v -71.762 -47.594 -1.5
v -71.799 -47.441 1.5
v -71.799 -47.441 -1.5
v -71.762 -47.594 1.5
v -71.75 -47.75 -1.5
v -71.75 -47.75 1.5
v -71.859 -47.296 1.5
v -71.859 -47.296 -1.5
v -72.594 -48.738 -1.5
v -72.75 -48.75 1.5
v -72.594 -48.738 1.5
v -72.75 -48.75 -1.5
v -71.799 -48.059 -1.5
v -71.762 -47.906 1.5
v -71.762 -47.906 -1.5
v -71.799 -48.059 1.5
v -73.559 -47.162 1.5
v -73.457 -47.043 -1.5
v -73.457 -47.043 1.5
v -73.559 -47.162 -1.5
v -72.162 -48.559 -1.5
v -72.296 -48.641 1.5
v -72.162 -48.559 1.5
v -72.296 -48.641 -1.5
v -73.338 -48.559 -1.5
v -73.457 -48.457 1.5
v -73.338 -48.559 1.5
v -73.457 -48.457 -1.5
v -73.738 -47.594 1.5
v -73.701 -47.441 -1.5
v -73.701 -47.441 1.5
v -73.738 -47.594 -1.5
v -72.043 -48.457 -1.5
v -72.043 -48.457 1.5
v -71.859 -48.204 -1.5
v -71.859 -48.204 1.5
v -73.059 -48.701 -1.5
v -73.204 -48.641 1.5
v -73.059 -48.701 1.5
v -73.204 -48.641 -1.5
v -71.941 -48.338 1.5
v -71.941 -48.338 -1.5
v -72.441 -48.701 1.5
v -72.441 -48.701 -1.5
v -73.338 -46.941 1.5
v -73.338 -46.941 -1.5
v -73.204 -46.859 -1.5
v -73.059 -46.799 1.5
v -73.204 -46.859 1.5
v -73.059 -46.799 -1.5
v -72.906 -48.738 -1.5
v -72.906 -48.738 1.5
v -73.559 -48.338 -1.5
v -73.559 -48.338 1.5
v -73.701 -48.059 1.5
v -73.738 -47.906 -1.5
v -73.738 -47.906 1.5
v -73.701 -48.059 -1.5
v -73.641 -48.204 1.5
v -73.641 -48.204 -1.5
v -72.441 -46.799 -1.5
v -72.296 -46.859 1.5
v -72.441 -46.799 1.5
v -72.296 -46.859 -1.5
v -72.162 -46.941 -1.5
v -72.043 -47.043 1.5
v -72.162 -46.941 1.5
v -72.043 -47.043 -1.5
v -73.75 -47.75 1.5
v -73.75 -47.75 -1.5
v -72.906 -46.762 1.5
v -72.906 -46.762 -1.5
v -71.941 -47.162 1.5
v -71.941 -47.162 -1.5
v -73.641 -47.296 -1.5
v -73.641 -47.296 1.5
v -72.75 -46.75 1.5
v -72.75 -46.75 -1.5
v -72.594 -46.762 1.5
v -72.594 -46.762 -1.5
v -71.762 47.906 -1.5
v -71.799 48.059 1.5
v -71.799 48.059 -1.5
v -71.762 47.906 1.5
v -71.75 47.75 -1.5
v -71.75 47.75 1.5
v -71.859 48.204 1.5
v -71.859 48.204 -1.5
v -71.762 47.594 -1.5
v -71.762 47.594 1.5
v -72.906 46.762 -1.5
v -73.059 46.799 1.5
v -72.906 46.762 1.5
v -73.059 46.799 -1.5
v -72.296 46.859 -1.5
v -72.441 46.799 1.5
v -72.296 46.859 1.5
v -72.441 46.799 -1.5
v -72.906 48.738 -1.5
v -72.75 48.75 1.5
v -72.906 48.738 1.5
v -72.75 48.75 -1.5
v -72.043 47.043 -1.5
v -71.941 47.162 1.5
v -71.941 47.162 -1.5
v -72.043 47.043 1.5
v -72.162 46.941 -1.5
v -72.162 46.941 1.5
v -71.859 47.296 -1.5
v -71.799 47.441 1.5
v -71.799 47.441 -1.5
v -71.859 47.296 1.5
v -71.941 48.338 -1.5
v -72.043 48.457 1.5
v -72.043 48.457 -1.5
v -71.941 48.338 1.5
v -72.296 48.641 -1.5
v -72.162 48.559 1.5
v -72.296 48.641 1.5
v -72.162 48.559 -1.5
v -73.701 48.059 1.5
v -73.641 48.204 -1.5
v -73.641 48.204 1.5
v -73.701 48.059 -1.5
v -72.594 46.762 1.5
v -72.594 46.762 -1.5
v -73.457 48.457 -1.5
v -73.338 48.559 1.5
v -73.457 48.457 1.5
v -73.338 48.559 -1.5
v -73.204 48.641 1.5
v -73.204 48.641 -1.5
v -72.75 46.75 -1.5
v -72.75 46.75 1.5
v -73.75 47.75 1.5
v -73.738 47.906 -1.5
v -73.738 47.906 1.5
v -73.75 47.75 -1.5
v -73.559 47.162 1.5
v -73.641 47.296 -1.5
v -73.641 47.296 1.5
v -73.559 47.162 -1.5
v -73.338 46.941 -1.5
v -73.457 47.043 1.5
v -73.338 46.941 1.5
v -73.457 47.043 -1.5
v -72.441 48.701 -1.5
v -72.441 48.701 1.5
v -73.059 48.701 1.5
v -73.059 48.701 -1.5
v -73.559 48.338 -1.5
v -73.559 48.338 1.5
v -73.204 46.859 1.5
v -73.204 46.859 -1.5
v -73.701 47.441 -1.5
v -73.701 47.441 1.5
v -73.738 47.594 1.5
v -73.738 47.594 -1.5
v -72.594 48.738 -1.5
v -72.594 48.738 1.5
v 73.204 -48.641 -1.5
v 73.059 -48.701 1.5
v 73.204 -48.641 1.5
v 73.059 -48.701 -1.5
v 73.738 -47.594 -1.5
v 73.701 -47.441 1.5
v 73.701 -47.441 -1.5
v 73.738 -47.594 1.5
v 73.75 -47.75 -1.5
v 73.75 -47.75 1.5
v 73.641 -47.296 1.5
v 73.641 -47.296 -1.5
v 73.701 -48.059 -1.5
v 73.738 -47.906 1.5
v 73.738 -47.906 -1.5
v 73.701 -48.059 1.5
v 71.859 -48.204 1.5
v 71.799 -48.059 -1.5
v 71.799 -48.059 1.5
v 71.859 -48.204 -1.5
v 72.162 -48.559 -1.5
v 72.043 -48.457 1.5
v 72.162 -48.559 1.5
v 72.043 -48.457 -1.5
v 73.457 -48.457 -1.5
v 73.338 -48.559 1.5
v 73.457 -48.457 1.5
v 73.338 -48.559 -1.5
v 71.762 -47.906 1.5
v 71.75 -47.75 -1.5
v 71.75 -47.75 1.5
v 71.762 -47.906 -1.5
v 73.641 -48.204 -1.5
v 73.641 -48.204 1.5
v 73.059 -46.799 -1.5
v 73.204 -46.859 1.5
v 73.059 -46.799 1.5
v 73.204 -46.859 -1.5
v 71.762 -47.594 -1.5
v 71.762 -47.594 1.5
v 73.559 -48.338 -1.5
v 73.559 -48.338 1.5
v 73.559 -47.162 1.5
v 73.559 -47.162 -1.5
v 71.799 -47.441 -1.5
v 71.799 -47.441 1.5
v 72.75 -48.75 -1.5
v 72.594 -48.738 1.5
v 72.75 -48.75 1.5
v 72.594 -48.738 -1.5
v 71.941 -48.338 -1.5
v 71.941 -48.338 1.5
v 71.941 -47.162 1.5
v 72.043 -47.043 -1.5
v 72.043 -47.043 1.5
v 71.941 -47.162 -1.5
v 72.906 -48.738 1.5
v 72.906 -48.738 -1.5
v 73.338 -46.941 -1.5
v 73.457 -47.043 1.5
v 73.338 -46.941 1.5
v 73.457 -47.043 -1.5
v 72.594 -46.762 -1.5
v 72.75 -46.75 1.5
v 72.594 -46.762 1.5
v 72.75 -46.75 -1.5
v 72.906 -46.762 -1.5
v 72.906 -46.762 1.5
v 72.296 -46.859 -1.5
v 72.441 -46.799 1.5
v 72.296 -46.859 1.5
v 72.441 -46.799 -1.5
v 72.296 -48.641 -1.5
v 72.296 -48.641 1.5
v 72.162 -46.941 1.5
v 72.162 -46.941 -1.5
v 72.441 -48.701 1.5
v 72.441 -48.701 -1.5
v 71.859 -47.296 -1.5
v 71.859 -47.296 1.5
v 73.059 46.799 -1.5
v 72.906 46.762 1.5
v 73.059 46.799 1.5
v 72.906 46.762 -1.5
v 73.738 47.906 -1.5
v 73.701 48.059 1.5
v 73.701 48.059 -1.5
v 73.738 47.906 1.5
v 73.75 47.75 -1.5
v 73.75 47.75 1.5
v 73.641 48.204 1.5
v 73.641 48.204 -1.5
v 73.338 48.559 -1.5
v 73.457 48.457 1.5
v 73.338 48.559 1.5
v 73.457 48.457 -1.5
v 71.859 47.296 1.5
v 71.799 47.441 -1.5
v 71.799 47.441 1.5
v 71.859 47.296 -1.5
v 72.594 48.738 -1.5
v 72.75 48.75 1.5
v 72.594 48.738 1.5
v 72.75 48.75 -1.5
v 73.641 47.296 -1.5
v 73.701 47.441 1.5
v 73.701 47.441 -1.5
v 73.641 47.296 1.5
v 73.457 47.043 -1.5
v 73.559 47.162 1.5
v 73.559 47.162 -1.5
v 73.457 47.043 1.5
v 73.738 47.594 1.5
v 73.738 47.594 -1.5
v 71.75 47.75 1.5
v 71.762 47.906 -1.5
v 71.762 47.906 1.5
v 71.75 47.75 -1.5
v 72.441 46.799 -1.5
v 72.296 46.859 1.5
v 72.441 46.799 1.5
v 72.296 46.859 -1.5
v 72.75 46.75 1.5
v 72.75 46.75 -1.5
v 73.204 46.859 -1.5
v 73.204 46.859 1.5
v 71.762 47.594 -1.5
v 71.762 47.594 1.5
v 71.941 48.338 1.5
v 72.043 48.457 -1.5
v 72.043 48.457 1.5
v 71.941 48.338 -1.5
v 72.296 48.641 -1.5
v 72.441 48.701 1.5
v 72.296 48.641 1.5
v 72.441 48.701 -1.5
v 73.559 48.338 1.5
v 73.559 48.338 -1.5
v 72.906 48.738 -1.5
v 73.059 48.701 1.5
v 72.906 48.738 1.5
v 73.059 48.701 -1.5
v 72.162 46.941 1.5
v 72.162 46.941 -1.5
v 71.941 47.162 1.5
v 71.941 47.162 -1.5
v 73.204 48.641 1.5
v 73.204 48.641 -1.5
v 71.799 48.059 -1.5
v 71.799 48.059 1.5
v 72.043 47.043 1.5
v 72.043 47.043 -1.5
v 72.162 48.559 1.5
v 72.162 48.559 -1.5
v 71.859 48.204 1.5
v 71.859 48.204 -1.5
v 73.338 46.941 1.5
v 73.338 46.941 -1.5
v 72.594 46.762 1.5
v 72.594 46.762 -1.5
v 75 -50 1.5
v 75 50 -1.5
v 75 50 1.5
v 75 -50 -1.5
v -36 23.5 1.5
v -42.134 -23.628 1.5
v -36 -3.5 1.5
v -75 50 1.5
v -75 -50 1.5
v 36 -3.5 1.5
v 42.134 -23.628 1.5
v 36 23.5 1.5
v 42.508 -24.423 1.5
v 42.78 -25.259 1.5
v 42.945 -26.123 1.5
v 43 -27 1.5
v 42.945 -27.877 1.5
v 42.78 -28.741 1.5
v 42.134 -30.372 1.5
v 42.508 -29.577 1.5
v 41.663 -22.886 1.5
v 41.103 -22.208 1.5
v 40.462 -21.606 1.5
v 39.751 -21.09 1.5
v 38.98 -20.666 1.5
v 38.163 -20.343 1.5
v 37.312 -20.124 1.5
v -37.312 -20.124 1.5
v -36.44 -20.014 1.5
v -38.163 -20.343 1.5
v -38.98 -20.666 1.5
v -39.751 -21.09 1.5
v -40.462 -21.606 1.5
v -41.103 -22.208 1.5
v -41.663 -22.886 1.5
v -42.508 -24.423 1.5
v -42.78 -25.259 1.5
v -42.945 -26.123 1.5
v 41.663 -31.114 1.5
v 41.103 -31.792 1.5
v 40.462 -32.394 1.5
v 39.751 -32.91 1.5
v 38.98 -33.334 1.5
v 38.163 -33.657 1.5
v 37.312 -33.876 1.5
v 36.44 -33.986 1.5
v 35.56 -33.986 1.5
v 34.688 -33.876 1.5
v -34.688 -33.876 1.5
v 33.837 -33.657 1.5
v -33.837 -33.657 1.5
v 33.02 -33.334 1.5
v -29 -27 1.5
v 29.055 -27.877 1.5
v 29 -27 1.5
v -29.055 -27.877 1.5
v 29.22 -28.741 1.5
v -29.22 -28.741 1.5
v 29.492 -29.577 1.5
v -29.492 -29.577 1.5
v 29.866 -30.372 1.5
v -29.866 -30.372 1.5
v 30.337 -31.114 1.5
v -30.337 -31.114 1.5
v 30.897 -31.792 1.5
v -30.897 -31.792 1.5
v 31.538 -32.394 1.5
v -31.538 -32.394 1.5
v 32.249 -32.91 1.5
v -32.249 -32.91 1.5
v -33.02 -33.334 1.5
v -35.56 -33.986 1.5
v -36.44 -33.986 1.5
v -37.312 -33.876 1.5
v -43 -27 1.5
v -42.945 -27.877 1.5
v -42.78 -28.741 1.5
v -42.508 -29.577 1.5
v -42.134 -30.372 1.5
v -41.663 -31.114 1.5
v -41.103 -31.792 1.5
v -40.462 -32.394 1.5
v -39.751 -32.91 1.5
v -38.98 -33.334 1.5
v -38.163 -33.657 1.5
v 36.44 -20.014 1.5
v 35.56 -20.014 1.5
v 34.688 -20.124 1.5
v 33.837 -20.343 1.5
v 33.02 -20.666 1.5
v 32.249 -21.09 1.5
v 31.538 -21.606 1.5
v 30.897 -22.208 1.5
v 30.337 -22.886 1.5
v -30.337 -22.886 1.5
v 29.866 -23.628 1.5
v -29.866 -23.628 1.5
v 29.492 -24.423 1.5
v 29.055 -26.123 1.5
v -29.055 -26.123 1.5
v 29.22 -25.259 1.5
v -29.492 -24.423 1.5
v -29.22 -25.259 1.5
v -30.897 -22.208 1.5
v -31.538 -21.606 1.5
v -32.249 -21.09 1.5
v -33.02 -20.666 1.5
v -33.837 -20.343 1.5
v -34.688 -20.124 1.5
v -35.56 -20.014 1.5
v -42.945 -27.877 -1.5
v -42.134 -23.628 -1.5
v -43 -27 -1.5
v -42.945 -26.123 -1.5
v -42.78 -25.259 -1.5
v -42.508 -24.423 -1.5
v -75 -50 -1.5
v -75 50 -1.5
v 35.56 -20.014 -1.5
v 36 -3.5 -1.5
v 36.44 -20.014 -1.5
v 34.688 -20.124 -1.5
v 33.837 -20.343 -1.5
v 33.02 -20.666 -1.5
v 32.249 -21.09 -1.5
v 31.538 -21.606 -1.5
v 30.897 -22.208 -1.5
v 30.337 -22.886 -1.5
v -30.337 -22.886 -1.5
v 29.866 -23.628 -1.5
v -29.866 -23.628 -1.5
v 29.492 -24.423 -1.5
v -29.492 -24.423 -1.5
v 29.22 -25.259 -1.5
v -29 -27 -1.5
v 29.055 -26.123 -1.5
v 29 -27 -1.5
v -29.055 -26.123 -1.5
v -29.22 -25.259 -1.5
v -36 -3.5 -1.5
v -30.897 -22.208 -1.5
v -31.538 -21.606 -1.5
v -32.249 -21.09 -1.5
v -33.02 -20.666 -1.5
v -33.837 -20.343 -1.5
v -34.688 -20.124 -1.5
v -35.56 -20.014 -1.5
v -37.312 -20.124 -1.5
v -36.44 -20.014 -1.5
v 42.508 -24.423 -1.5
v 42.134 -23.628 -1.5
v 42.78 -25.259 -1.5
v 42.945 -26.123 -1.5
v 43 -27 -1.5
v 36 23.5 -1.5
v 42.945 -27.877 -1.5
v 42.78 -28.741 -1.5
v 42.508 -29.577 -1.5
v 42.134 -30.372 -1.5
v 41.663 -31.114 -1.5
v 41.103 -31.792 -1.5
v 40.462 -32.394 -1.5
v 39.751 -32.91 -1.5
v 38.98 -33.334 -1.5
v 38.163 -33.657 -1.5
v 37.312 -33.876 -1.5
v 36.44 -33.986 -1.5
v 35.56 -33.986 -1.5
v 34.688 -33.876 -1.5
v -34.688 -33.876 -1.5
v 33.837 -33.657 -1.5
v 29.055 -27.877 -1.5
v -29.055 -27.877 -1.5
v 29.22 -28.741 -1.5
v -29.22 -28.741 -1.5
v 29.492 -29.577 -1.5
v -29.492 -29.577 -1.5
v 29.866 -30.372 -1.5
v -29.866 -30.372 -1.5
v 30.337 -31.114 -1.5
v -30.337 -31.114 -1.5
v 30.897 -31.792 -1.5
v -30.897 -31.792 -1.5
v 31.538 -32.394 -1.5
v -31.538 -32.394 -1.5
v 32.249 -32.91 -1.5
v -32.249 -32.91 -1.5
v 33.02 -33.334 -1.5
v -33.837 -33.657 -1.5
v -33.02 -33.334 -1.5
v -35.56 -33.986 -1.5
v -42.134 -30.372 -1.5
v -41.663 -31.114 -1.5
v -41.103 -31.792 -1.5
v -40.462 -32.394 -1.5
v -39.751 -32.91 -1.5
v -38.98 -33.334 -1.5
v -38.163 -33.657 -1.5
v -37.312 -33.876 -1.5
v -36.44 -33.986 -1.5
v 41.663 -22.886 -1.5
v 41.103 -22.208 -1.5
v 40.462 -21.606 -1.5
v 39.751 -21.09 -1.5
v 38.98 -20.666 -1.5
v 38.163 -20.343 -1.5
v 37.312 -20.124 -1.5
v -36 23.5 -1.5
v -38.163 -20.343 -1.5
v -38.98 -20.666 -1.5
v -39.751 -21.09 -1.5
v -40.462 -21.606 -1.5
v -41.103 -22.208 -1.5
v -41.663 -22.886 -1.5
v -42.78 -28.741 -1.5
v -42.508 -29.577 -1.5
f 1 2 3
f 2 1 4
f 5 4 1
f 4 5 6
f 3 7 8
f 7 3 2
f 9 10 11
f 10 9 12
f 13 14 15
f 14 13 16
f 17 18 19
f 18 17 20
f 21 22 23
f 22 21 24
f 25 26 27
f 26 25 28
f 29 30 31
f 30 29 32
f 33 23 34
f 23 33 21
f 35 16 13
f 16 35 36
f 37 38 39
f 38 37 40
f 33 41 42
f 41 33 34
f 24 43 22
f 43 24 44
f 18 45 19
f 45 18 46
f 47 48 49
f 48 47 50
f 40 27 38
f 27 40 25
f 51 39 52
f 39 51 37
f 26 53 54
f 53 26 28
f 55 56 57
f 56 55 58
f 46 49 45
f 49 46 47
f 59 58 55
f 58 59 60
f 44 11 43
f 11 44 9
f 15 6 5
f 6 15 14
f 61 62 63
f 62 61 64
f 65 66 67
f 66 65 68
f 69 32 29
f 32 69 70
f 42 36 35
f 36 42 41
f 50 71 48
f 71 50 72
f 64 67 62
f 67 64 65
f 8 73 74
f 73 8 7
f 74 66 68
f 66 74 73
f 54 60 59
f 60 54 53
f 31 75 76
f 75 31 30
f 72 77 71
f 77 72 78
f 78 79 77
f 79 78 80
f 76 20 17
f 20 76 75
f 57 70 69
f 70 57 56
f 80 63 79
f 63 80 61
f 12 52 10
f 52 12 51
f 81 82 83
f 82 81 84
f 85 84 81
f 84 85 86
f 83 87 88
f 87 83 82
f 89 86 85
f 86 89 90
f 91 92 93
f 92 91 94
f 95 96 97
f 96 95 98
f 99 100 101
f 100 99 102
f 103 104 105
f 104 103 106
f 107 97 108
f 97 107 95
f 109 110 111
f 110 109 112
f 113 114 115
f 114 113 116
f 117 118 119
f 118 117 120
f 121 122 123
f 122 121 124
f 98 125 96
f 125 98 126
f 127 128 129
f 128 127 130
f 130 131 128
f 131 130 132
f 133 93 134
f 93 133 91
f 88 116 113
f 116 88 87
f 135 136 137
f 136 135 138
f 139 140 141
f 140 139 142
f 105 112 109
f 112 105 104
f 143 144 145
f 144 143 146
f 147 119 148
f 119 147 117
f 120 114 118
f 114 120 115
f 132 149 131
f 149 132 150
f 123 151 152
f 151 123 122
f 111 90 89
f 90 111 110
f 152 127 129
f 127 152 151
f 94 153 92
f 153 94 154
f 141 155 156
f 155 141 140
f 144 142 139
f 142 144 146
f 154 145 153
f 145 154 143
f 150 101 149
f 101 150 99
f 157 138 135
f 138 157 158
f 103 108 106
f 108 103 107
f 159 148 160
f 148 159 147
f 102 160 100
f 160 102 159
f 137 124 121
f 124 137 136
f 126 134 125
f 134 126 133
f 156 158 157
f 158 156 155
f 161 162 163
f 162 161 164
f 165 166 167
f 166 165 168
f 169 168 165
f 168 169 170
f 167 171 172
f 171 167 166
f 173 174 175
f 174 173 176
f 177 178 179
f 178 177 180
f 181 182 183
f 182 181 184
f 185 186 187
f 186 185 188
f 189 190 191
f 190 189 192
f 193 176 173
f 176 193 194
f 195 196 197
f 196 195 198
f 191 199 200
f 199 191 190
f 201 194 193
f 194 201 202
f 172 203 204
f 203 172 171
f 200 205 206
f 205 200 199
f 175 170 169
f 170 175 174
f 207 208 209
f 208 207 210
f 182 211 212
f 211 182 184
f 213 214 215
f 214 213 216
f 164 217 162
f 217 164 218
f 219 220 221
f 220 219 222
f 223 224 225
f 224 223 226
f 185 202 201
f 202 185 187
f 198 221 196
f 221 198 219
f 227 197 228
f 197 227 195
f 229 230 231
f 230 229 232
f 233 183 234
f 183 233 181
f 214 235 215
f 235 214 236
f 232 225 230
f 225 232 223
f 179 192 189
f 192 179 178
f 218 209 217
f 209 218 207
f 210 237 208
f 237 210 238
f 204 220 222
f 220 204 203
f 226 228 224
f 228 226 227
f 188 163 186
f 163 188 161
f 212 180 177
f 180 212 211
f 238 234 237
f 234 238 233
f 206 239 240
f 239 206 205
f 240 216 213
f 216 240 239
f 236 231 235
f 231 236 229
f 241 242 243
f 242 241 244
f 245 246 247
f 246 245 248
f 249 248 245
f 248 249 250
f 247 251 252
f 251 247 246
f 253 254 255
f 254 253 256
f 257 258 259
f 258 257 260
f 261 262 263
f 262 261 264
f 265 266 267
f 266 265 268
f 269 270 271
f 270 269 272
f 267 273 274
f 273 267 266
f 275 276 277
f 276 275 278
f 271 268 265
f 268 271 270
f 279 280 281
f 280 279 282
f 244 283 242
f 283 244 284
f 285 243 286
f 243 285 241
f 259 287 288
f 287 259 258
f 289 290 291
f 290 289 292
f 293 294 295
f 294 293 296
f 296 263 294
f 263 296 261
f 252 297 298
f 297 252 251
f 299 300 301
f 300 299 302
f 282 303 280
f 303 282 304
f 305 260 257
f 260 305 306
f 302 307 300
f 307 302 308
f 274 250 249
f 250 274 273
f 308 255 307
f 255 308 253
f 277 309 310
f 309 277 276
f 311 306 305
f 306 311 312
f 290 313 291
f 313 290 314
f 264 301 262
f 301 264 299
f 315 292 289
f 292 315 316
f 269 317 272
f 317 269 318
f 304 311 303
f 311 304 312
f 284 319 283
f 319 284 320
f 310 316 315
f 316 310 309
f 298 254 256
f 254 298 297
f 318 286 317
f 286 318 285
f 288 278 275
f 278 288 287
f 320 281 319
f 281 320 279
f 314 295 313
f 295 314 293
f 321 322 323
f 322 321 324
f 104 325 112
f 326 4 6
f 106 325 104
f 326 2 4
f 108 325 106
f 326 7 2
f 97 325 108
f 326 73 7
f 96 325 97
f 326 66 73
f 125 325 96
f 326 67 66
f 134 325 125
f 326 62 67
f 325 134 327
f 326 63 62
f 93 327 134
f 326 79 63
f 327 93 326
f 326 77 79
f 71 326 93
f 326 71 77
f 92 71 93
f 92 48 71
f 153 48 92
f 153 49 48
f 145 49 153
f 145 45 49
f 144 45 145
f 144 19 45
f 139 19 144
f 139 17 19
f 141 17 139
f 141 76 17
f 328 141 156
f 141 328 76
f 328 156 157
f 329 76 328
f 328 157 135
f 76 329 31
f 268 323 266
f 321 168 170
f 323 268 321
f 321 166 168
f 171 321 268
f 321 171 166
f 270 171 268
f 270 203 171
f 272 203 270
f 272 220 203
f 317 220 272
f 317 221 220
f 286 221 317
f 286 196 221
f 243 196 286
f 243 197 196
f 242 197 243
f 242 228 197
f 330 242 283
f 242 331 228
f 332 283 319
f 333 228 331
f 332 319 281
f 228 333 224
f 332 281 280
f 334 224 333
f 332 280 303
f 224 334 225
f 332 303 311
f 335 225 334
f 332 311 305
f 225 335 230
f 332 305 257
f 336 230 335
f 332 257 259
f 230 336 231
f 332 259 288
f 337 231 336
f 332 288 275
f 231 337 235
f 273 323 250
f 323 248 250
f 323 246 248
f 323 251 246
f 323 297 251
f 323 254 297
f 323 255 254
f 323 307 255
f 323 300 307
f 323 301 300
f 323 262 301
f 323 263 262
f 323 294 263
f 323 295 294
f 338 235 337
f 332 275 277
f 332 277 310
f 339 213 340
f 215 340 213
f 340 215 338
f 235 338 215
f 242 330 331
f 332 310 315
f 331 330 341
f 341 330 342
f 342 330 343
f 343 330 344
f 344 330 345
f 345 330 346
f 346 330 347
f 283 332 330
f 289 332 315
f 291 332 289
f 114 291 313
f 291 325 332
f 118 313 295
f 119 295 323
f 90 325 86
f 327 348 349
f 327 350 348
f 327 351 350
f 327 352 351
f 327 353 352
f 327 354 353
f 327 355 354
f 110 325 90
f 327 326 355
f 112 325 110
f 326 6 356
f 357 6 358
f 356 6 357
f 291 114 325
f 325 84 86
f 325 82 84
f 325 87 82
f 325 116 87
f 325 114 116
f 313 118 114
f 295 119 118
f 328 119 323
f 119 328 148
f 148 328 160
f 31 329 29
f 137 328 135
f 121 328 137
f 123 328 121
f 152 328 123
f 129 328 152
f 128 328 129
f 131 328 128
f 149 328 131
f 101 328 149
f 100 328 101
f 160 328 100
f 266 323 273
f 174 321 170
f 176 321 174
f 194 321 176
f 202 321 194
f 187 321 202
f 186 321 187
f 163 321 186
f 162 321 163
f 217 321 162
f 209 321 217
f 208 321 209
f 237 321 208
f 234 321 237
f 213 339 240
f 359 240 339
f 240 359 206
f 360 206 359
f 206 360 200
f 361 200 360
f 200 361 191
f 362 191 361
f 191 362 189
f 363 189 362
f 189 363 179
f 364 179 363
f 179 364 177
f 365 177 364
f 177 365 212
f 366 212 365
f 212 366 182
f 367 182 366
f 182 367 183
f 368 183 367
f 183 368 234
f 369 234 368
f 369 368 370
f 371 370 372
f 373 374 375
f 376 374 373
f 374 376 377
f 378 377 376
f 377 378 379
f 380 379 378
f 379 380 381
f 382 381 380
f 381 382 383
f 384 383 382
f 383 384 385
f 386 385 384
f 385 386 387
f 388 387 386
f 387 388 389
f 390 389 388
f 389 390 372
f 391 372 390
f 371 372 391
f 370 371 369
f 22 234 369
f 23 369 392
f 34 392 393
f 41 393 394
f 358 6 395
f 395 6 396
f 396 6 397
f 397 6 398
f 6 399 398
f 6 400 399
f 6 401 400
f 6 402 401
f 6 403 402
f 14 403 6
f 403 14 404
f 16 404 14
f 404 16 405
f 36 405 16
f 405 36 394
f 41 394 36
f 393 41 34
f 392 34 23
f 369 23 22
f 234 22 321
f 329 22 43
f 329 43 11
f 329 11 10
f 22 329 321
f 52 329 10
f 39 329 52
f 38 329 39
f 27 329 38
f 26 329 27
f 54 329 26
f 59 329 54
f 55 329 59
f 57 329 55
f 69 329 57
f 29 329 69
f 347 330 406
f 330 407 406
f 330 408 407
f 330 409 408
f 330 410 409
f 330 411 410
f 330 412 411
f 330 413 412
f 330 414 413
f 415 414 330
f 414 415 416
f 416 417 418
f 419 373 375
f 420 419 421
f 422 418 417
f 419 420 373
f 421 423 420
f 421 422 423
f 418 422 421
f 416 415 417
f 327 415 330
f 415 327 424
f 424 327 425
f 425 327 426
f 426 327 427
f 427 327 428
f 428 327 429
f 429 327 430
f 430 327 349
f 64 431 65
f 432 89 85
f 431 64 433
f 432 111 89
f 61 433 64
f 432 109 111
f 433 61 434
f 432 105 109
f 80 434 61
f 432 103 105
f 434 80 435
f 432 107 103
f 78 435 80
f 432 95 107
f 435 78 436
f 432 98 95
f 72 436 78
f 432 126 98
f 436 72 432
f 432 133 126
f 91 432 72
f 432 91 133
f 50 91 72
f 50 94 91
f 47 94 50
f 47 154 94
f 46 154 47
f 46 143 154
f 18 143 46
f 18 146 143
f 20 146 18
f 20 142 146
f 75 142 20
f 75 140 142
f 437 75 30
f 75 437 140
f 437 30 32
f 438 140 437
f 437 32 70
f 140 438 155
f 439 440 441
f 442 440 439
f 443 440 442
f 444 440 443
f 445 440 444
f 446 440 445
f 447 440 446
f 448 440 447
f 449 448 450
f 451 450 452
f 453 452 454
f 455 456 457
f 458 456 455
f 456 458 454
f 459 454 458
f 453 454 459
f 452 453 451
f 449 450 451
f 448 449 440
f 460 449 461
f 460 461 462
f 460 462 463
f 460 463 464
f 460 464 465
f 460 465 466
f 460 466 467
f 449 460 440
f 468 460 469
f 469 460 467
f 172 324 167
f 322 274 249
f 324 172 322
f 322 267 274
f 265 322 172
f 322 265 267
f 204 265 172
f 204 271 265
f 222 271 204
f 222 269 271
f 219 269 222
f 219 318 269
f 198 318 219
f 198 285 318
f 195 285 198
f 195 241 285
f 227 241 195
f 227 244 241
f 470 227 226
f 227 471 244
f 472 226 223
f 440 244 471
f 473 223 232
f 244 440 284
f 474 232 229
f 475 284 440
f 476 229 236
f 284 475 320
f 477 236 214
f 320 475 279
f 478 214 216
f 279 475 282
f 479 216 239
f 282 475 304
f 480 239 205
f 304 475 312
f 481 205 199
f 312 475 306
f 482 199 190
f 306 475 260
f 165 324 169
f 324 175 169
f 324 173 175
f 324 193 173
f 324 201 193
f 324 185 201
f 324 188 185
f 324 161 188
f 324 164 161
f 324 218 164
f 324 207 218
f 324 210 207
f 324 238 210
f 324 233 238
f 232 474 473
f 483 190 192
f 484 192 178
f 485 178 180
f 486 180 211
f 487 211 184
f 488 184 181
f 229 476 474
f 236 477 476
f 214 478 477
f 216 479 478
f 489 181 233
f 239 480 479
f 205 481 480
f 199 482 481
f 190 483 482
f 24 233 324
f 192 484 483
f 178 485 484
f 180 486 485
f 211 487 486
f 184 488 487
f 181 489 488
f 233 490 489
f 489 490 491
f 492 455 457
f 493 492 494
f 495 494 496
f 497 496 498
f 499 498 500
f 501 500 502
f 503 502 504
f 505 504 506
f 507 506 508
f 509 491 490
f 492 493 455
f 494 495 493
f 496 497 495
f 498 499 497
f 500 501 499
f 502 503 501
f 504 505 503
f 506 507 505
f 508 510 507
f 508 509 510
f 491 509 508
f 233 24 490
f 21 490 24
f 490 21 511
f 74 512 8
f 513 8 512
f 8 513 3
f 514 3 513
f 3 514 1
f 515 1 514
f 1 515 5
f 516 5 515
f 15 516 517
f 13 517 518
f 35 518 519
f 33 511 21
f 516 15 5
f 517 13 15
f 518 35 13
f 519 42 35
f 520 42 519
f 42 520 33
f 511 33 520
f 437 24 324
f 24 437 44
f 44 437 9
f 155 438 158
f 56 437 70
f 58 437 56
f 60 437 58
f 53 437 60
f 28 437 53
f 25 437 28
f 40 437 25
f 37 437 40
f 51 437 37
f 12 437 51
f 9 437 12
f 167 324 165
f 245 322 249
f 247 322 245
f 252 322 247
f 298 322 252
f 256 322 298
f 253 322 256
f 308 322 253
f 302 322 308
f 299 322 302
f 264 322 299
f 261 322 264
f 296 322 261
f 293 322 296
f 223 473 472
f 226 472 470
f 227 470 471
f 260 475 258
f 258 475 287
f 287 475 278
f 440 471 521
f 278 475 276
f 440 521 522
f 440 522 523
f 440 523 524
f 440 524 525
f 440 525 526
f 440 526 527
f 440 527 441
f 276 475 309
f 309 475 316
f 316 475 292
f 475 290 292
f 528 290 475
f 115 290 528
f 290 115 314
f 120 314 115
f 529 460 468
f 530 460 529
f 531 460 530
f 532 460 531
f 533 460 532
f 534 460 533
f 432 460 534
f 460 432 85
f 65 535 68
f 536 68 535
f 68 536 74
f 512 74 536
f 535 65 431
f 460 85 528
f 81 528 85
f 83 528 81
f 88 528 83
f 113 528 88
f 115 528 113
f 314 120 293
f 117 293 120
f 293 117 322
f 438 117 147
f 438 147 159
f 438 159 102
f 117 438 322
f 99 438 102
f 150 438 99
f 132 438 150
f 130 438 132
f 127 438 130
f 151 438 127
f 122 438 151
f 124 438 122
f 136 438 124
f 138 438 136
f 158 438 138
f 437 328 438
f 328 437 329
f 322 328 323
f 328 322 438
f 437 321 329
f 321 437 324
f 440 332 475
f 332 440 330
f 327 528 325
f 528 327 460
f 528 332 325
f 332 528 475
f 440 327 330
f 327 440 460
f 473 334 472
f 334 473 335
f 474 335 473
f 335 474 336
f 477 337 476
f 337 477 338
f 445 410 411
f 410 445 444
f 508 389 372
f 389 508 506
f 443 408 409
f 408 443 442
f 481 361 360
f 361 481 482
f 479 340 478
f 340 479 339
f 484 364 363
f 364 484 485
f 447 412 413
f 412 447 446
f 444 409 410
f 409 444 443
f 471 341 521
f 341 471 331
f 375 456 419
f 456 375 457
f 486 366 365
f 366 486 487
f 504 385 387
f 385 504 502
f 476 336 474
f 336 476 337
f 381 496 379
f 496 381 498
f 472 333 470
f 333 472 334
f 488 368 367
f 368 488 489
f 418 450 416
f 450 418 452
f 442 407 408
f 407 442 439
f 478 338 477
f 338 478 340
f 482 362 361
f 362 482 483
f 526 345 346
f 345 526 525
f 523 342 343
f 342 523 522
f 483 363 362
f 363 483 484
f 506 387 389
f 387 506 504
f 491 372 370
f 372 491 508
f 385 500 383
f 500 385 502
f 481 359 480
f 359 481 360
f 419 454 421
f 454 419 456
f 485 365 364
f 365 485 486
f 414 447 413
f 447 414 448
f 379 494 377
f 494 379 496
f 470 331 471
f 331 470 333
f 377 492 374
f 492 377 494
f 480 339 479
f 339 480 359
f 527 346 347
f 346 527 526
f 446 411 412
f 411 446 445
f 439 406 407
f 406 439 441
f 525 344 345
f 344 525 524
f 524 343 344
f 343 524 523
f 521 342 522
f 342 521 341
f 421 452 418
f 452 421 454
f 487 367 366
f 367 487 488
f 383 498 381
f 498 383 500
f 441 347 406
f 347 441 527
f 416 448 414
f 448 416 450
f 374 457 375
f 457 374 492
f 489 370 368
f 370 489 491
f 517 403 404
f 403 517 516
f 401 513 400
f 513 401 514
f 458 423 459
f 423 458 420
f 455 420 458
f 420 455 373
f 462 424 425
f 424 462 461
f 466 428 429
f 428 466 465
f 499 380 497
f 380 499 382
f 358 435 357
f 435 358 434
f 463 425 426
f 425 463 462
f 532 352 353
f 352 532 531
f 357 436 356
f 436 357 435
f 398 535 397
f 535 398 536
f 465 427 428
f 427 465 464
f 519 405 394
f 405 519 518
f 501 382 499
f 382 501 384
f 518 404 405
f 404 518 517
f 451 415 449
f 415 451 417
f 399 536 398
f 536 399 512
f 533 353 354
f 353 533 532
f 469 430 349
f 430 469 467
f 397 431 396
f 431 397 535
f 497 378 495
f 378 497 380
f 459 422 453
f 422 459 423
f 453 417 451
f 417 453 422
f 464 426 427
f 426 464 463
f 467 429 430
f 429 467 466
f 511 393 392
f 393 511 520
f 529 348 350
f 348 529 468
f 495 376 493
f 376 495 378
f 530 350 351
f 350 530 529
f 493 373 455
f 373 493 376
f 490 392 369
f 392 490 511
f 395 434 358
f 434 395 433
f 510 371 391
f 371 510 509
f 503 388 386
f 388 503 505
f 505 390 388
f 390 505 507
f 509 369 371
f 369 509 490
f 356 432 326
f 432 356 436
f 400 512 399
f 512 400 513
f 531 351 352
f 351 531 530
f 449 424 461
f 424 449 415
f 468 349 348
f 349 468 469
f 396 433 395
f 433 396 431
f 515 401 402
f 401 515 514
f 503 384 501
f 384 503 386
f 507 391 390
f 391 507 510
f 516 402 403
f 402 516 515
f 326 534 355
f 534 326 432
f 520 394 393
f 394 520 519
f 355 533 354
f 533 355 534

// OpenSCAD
a = 150;
b = 100;
c = 3;
screen_x = 72;
screen_y = 27;
button_r = 7;
shift = c+c/2;
leg_r = 1;
difference() {
    cube([a,b,c], true);
    translate([0,10,0]) {
	    cube([screen_x,screen_y,2*c], true);
    }
	 translate([screen_x/2,-screen_y,0]) {
       cylinder(h=2*c,r=button_r, $fn=50, center=true);
    }
    translate([-screen_x/2,-screen_y,0]) {
       cylinder(h=2*c,r=button_r, $fn=50, center=true);
    }

for (dx = [-(a-shift)/2, (a-shift)/2])
    for (dy = [-(b-shift)/2, (b-shift)/2]) {
        translate([dx, dy, -c]) {
            cylinder(h=2*c, r=leg_r, $fn=40);
        }
    }
};
